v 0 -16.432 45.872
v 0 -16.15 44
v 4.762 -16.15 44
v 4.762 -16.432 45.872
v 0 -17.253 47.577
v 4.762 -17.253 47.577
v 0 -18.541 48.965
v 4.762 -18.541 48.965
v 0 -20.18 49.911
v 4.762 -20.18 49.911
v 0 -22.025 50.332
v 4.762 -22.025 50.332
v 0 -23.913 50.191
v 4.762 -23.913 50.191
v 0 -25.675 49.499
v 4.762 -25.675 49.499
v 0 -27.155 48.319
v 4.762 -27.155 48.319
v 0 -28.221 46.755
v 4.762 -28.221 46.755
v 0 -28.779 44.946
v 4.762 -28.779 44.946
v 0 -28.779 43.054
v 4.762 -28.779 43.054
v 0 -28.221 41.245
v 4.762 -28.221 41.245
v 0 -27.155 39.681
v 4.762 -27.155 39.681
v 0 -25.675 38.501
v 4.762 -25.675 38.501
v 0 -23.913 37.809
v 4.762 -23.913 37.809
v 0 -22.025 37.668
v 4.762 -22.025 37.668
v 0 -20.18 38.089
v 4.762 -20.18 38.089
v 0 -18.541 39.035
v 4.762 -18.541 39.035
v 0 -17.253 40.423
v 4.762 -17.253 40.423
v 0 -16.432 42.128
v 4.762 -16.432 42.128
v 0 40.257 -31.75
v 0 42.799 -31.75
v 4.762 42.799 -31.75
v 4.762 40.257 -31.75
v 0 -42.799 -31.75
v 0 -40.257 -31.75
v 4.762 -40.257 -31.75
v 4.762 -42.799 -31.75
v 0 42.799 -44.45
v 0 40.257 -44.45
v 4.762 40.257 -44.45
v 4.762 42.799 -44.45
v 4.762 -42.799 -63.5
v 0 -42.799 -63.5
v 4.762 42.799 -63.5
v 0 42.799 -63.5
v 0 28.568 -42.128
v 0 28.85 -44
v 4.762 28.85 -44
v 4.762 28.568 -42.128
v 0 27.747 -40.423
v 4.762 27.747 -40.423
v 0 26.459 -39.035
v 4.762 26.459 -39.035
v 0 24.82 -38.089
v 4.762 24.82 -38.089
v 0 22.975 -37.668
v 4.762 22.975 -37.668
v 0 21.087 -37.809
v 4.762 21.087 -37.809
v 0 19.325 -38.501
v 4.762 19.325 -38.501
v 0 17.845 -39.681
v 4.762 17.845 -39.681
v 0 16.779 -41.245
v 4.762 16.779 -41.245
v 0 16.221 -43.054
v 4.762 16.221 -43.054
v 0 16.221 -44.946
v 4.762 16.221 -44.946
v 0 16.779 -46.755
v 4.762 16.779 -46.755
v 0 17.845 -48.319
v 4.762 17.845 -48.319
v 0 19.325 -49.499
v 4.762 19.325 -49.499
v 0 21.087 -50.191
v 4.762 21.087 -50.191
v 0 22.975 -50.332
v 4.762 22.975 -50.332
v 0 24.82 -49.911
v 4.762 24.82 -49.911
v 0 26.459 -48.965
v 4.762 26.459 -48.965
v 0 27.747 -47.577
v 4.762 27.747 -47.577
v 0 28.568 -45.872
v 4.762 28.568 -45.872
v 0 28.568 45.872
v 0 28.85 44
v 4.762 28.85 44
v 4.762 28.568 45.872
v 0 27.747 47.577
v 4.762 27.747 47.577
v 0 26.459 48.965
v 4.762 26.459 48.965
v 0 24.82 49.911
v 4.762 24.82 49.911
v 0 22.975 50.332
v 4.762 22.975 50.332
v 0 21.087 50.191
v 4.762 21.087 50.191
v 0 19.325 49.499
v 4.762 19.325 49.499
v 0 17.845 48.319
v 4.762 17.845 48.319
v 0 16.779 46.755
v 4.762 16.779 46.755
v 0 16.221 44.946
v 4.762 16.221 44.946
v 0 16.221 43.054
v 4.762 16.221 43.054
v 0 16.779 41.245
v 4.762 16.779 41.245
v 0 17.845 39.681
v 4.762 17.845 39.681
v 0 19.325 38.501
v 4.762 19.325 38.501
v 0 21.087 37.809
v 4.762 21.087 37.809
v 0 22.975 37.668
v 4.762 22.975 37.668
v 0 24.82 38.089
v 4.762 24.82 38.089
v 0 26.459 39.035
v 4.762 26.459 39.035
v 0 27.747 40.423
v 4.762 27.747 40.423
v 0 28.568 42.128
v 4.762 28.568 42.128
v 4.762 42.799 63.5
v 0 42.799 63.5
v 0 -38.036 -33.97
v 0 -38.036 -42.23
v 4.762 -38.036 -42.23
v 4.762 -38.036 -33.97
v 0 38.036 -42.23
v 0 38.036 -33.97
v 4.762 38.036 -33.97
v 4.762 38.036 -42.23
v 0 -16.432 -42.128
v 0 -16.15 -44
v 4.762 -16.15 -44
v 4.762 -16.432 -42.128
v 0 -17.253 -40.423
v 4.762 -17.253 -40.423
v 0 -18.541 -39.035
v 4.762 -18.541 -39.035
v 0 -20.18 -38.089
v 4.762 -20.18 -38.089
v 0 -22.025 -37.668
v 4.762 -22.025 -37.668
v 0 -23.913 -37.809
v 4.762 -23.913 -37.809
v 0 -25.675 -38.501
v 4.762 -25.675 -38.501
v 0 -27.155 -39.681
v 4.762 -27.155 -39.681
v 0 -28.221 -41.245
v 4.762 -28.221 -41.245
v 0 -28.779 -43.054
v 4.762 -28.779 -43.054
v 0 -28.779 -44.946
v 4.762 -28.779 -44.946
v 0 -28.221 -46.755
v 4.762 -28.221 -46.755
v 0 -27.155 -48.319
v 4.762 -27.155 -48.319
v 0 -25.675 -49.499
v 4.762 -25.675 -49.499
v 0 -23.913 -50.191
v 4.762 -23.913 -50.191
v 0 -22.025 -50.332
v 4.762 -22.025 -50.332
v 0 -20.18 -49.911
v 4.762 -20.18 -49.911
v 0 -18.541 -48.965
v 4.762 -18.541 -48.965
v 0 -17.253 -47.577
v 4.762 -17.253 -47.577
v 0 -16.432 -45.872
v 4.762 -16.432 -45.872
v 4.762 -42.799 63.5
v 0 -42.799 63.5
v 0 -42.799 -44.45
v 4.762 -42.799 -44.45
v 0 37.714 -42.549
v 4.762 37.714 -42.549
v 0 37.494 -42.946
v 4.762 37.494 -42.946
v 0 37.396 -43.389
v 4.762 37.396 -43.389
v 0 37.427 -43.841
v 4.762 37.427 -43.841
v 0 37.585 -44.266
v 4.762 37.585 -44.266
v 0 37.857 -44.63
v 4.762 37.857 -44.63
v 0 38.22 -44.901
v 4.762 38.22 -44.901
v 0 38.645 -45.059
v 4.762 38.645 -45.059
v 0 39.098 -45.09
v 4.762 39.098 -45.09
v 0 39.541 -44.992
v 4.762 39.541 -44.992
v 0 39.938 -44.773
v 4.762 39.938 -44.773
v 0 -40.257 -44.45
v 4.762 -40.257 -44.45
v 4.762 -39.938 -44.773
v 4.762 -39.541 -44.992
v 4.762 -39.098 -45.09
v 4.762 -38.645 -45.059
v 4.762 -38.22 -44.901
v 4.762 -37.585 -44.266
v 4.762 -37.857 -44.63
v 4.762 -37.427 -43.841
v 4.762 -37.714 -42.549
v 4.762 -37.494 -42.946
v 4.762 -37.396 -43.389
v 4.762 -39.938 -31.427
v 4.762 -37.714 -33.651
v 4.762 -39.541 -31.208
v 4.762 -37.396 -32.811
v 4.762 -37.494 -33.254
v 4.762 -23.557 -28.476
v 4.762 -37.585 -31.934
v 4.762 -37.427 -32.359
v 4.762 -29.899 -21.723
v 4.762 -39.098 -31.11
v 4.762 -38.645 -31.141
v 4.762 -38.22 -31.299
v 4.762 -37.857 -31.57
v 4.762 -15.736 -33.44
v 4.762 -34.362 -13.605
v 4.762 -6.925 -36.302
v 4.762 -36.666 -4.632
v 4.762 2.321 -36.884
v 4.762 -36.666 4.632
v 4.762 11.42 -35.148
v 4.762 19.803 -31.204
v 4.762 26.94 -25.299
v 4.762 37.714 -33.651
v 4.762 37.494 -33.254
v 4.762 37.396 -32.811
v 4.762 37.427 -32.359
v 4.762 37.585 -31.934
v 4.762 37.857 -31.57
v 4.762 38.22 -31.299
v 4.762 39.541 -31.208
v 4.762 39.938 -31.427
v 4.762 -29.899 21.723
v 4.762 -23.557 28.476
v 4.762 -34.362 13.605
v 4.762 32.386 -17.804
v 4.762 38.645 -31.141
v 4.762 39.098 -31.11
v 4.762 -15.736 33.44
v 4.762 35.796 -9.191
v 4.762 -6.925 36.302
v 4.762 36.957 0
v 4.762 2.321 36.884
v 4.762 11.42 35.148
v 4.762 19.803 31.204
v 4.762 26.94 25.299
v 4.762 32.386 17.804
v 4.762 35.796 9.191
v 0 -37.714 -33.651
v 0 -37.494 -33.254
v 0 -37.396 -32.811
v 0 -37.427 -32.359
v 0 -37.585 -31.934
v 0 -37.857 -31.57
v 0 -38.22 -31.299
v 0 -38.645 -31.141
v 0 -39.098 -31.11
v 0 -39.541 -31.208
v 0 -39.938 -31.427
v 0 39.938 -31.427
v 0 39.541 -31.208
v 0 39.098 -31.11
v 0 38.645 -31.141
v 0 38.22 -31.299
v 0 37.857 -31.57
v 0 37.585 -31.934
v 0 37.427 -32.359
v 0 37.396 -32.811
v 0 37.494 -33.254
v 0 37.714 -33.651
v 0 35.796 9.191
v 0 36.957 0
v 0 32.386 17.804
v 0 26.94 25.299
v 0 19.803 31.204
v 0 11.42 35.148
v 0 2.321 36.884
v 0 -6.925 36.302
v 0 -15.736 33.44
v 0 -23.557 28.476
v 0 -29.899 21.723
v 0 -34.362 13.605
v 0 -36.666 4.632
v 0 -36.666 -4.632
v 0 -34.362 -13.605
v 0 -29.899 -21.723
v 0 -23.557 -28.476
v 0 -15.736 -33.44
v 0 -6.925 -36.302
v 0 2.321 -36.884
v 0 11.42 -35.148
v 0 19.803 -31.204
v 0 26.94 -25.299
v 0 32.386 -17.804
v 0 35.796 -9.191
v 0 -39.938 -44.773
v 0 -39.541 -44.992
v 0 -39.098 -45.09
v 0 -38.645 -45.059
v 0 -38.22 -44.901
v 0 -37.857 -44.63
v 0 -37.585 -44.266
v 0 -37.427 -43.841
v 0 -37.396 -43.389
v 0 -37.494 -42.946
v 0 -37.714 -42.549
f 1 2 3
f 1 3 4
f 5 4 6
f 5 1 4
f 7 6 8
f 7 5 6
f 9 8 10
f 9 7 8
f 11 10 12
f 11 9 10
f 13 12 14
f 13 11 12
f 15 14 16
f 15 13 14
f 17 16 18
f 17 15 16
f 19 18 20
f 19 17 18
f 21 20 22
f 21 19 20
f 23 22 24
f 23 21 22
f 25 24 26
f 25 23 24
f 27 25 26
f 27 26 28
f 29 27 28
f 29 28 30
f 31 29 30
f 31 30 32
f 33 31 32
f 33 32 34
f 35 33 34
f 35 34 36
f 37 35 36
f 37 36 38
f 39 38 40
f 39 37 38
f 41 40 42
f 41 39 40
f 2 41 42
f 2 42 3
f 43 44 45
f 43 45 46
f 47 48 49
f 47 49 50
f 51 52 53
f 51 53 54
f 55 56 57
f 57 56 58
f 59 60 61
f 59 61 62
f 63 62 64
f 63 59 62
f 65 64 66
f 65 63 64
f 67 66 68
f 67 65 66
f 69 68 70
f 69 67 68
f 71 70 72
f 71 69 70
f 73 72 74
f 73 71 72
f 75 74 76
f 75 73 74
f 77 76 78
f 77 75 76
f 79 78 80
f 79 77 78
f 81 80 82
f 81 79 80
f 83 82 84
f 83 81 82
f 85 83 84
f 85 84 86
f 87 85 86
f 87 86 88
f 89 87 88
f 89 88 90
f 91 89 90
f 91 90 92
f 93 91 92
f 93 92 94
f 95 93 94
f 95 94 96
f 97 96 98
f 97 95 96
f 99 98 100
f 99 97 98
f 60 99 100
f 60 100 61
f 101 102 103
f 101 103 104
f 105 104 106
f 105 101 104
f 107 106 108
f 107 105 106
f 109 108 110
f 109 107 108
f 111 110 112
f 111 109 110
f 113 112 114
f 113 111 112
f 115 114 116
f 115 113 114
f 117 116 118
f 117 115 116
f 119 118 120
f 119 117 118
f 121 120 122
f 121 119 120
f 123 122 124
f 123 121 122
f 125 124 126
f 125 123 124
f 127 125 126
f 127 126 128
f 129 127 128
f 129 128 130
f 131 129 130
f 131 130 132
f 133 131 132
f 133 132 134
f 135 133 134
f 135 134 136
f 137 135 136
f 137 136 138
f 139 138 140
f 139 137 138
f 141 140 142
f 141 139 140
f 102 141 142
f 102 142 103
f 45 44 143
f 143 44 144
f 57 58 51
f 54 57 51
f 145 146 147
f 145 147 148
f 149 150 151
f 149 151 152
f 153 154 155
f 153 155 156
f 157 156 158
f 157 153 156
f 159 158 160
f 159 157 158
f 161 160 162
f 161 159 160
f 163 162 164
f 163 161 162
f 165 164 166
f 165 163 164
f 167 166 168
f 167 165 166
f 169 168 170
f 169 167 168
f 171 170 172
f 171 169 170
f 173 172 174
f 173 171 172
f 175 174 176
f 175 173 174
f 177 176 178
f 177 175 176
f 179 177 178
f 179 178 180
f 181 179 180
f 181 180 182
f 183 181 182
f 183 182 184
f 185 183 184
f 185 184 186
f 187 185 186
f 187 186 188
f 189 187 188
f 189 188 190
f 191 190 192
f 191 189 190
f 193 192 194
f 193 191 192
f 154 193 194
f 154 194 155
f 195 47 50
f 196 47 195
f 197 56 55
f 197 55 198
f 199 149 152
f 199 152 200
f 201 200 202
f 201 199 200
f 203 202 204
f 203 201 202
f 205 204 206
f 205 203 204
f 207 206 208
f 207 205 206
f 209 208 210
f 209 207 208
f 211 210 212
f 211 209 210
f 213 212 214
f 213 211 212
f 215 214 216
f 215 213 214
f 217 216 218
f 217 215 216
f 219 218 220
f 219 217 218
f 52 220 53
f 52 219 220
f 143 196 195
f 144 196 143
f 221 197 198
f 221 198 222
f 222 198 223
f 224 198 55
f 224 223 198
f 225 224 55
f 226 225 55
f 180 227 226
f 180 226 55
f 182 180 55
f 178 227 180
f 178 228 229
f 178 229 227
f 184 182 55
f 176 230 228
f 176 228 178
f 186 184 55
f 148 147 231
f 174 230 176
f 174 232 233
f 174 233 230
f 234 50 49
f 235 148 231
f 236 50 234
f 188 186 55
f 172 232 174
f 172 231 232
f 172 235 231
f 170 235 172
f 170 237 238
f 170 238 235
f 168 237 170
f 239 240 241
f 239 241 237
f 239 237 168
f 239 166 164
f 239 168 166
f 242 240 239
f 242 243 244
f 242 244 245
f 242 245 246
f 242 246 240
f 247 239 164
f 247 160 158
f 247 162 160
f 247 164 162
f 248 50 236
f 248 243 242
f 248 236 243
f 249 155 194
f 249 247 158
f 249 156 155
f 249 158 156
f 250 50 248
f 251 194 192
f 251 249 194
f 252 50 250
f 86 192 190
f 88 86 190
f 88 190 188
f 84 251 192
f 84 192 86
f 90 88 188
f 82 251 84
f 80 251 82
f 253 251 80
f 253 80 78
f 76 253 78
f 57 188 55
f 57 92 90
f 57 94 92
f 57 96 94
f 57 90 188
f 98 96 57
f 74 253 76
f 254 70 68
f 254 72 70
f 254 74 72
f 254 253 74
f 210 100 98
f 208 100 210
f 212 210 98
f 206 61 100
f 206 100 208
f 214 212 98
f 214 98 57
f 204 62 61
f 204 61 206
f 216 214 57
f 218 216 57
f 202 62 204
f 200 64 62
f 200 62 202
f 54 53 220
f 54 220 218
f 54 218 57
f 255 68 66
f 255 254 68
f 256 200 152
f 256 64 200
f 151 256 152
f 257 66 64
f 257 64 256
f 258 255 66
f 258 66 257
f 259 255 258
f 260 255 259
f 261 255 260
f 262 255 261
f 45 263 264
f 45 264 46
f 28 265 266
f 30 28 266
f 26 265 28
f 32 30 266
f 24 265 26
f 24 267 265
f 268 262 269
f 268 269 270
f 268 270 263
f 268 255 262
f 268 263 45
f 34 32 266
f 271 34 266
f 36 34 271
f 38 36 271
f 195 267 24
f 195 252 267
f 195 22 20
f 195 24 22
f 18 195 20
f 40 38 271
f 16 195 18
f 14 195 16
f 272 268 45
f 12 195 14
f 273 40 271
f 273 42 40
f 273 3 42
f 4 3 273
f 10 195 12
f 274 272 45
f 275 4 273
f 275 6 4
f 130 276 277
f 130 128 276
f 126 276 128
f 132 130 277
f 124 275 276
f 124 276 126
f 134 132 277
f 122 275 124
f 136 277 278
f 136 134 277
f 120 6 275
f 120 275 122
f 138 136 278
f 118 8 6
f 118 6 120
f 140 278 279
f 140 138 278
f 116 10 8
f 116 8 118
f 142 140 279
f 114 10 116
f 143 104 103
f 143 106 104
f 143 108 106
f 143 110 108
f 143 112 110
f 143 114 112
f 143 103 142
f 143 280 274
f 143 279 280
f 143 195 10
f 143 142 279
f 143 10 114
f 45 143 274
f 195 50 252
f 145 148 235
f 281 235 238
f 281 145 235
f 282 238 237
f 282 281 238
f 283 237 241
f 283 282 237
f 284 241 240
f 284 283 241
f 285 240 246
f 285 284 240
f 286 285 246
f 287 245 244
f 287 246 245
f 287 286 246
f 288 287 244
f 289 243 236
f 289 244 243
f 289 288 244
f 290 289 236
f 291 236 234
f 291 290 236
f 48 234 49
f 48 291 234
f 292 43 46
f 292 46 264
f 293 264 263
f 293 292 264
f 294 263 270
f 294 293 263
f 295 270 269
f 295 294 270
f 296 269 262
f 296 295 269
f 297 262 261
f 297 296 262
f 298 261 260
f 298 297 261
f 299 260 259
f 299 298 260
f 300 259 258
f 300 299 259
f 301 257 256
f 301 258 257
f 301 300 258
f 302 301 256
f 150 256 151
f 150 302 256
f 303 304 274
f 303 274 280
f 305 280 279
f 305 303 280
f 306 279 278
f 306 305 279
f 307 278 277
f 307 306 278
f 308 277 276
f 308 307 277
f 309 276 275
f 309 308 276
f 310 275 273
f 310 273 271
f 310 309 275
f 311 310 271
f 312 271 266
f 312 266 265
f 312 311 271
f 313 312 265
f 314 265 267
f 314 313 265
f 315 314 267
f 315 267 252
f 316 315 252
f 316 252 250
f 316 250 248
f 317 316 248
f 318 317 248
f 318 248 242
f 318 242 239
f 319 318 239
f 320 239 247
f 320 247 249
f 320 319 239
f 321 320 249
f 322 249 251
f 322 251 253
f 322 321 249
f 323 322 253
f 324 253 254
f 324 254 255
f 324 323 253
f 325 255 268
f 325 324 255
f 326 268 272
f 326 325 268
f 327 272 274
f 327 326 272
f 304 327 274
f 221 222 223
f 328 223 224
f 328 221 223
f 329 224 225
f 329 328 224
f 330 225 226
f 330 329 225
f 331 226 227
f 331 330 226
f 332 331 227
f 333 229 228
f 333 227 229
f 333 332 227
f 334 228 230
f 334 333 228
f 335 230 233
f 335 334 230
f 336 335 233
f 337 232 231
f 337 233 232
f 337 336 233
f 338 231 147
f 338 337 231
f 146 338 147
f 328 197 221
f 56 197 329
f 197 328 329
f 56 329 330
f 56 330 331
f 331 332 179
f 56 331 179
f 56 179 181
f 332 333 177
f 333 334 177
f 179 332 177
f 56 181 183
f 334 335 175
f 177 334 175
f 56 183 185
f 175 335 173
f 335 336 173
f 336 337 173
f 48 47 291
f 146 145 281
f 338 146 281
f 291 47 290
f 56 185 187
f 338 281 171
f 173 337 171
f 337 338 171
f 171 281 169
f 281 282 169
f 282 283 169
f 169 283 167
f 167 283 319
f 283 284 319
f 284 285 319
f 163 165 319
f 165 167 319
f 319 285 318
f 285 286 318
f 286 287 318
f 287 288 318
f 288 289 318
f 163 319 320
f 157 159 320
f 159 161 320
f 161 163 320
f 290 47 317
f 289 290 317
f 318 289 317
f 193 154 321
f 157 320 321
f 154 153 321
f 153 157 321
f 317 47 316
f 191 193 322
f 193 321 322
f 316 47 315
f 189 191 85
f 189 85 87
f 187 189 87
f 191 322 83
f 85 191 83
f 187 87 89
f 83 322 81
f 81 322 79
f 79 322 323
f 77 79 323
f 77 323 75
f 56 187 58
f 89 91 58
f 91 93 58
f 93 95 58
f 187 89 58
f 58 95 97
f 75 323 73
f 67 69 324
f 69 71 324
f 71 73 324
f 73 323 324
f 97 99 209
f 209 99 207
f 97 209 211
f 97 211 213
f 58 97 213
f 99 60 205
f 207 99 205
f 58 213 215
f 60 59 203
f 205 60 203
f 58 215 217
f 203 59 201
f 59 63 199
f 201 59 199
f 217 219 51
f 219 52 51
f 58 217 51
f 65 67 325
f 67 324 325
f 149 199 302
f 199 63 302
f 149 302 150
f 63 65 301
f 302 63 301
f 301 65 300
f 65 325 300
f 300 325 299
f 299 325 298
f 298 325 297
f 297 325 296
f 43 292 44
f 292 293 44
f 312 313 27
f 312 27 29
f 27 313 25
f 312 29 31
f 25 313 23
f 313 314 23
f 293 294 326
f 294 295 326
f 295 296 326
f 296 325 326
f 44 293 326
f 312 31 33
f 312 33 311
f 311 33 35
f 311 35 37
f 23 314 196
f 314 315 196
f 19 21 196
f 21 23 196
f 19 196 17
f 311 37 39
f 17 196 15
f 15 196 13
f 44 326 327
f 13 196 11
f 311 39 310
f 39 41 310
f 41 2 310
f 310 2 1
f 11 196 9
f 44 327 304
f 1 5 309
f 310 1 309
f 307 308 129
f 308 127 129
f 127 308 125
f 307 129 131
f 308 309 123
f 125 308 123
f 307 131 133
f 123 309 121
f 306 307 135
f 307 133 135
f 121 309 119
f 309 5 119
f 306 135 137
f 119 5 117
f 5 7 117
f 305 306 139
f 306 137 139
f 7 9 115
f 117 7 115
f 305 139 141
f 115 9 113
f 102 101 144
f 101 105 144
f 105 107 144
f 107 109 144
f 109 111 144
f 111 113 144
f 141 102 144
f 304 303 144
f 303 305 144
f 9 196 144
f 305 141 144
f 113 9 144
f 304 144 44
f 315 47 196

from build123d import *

# Parameters (mm, degrees)
F0_W     = 85.598
F0_H     = 127
F0_R     = 6.35
F0_R_2   = 36.957
F1_DEPTH = 4.7625
F3_DEPTH = 4.7635


with BuildPart() as f1:
    # F0 (on Right) → F1 (new body)
    with BuildSketch(Plane.YZ):
        Rectangle(F0_W, F0_H)
        with Locations((-22.5, -44)):
            Circle(F0_R, mode=Mode.SUBTRACT)
        with Locations((22.5, -44)):
            Circle(F0_R, mode=Mode.SUBTRACT)
        with Locations((-22.5, 44)):
            Circle(F0_R, mode=Mode.SUBTRACT)
        Circle(F0_R_2, mode=Mode.SUBTRACT)
        with Locations((22.5, 44)):
            Circle(F0_R, mode=Mode.SUBTRACT)
    extrude(amount=F1_DEPTH)

    # F2 (on Right) → F3 (cut, through all)
    with BuildSketch(Plane.YZ):
        with BuildLine():
            Line((-42.799, -31.75), (-42.799, -44.45))
            Line((-42.799, -44.45), (-40.256551, -44.45))
            ThreePointArc((-40.256551, -44.45), (-37.856895, -44.629605), (-38.0365, -42.229949))
            Line((-38.0365, -42.229949), (-38.0365, -33.970051))
            ThreePointArc((-38.0365, -33.970051), (-37.856895, -31.570395), (-40.256551, -31.75))
            Line((-40.256551, -31.75), (-42.799, -31.75))
        make_face()
        with BuildLine():
            Line((42.799, -44.45), (42.799, -31.75))
            Line((42.799, -31.75), (40.256551, -31.75))
            ThreePointArc((40.256551, -31.75), (37.856895, -31.570395), (38.0365, -33.970051))
            Line((38.0365, -33.970051), (38.0365, -42.229949))
            ThreePointArc((38.0365, -42.229949), (37.856895, -44.629605), (40.256551, -44.45))
            Line((40.256551, -44.45), (42.799, -44.45))
        make_face()
    extrude(amount=F3_DEPTH, mode=Mode.SUBTRACT)


solid = f1.part
